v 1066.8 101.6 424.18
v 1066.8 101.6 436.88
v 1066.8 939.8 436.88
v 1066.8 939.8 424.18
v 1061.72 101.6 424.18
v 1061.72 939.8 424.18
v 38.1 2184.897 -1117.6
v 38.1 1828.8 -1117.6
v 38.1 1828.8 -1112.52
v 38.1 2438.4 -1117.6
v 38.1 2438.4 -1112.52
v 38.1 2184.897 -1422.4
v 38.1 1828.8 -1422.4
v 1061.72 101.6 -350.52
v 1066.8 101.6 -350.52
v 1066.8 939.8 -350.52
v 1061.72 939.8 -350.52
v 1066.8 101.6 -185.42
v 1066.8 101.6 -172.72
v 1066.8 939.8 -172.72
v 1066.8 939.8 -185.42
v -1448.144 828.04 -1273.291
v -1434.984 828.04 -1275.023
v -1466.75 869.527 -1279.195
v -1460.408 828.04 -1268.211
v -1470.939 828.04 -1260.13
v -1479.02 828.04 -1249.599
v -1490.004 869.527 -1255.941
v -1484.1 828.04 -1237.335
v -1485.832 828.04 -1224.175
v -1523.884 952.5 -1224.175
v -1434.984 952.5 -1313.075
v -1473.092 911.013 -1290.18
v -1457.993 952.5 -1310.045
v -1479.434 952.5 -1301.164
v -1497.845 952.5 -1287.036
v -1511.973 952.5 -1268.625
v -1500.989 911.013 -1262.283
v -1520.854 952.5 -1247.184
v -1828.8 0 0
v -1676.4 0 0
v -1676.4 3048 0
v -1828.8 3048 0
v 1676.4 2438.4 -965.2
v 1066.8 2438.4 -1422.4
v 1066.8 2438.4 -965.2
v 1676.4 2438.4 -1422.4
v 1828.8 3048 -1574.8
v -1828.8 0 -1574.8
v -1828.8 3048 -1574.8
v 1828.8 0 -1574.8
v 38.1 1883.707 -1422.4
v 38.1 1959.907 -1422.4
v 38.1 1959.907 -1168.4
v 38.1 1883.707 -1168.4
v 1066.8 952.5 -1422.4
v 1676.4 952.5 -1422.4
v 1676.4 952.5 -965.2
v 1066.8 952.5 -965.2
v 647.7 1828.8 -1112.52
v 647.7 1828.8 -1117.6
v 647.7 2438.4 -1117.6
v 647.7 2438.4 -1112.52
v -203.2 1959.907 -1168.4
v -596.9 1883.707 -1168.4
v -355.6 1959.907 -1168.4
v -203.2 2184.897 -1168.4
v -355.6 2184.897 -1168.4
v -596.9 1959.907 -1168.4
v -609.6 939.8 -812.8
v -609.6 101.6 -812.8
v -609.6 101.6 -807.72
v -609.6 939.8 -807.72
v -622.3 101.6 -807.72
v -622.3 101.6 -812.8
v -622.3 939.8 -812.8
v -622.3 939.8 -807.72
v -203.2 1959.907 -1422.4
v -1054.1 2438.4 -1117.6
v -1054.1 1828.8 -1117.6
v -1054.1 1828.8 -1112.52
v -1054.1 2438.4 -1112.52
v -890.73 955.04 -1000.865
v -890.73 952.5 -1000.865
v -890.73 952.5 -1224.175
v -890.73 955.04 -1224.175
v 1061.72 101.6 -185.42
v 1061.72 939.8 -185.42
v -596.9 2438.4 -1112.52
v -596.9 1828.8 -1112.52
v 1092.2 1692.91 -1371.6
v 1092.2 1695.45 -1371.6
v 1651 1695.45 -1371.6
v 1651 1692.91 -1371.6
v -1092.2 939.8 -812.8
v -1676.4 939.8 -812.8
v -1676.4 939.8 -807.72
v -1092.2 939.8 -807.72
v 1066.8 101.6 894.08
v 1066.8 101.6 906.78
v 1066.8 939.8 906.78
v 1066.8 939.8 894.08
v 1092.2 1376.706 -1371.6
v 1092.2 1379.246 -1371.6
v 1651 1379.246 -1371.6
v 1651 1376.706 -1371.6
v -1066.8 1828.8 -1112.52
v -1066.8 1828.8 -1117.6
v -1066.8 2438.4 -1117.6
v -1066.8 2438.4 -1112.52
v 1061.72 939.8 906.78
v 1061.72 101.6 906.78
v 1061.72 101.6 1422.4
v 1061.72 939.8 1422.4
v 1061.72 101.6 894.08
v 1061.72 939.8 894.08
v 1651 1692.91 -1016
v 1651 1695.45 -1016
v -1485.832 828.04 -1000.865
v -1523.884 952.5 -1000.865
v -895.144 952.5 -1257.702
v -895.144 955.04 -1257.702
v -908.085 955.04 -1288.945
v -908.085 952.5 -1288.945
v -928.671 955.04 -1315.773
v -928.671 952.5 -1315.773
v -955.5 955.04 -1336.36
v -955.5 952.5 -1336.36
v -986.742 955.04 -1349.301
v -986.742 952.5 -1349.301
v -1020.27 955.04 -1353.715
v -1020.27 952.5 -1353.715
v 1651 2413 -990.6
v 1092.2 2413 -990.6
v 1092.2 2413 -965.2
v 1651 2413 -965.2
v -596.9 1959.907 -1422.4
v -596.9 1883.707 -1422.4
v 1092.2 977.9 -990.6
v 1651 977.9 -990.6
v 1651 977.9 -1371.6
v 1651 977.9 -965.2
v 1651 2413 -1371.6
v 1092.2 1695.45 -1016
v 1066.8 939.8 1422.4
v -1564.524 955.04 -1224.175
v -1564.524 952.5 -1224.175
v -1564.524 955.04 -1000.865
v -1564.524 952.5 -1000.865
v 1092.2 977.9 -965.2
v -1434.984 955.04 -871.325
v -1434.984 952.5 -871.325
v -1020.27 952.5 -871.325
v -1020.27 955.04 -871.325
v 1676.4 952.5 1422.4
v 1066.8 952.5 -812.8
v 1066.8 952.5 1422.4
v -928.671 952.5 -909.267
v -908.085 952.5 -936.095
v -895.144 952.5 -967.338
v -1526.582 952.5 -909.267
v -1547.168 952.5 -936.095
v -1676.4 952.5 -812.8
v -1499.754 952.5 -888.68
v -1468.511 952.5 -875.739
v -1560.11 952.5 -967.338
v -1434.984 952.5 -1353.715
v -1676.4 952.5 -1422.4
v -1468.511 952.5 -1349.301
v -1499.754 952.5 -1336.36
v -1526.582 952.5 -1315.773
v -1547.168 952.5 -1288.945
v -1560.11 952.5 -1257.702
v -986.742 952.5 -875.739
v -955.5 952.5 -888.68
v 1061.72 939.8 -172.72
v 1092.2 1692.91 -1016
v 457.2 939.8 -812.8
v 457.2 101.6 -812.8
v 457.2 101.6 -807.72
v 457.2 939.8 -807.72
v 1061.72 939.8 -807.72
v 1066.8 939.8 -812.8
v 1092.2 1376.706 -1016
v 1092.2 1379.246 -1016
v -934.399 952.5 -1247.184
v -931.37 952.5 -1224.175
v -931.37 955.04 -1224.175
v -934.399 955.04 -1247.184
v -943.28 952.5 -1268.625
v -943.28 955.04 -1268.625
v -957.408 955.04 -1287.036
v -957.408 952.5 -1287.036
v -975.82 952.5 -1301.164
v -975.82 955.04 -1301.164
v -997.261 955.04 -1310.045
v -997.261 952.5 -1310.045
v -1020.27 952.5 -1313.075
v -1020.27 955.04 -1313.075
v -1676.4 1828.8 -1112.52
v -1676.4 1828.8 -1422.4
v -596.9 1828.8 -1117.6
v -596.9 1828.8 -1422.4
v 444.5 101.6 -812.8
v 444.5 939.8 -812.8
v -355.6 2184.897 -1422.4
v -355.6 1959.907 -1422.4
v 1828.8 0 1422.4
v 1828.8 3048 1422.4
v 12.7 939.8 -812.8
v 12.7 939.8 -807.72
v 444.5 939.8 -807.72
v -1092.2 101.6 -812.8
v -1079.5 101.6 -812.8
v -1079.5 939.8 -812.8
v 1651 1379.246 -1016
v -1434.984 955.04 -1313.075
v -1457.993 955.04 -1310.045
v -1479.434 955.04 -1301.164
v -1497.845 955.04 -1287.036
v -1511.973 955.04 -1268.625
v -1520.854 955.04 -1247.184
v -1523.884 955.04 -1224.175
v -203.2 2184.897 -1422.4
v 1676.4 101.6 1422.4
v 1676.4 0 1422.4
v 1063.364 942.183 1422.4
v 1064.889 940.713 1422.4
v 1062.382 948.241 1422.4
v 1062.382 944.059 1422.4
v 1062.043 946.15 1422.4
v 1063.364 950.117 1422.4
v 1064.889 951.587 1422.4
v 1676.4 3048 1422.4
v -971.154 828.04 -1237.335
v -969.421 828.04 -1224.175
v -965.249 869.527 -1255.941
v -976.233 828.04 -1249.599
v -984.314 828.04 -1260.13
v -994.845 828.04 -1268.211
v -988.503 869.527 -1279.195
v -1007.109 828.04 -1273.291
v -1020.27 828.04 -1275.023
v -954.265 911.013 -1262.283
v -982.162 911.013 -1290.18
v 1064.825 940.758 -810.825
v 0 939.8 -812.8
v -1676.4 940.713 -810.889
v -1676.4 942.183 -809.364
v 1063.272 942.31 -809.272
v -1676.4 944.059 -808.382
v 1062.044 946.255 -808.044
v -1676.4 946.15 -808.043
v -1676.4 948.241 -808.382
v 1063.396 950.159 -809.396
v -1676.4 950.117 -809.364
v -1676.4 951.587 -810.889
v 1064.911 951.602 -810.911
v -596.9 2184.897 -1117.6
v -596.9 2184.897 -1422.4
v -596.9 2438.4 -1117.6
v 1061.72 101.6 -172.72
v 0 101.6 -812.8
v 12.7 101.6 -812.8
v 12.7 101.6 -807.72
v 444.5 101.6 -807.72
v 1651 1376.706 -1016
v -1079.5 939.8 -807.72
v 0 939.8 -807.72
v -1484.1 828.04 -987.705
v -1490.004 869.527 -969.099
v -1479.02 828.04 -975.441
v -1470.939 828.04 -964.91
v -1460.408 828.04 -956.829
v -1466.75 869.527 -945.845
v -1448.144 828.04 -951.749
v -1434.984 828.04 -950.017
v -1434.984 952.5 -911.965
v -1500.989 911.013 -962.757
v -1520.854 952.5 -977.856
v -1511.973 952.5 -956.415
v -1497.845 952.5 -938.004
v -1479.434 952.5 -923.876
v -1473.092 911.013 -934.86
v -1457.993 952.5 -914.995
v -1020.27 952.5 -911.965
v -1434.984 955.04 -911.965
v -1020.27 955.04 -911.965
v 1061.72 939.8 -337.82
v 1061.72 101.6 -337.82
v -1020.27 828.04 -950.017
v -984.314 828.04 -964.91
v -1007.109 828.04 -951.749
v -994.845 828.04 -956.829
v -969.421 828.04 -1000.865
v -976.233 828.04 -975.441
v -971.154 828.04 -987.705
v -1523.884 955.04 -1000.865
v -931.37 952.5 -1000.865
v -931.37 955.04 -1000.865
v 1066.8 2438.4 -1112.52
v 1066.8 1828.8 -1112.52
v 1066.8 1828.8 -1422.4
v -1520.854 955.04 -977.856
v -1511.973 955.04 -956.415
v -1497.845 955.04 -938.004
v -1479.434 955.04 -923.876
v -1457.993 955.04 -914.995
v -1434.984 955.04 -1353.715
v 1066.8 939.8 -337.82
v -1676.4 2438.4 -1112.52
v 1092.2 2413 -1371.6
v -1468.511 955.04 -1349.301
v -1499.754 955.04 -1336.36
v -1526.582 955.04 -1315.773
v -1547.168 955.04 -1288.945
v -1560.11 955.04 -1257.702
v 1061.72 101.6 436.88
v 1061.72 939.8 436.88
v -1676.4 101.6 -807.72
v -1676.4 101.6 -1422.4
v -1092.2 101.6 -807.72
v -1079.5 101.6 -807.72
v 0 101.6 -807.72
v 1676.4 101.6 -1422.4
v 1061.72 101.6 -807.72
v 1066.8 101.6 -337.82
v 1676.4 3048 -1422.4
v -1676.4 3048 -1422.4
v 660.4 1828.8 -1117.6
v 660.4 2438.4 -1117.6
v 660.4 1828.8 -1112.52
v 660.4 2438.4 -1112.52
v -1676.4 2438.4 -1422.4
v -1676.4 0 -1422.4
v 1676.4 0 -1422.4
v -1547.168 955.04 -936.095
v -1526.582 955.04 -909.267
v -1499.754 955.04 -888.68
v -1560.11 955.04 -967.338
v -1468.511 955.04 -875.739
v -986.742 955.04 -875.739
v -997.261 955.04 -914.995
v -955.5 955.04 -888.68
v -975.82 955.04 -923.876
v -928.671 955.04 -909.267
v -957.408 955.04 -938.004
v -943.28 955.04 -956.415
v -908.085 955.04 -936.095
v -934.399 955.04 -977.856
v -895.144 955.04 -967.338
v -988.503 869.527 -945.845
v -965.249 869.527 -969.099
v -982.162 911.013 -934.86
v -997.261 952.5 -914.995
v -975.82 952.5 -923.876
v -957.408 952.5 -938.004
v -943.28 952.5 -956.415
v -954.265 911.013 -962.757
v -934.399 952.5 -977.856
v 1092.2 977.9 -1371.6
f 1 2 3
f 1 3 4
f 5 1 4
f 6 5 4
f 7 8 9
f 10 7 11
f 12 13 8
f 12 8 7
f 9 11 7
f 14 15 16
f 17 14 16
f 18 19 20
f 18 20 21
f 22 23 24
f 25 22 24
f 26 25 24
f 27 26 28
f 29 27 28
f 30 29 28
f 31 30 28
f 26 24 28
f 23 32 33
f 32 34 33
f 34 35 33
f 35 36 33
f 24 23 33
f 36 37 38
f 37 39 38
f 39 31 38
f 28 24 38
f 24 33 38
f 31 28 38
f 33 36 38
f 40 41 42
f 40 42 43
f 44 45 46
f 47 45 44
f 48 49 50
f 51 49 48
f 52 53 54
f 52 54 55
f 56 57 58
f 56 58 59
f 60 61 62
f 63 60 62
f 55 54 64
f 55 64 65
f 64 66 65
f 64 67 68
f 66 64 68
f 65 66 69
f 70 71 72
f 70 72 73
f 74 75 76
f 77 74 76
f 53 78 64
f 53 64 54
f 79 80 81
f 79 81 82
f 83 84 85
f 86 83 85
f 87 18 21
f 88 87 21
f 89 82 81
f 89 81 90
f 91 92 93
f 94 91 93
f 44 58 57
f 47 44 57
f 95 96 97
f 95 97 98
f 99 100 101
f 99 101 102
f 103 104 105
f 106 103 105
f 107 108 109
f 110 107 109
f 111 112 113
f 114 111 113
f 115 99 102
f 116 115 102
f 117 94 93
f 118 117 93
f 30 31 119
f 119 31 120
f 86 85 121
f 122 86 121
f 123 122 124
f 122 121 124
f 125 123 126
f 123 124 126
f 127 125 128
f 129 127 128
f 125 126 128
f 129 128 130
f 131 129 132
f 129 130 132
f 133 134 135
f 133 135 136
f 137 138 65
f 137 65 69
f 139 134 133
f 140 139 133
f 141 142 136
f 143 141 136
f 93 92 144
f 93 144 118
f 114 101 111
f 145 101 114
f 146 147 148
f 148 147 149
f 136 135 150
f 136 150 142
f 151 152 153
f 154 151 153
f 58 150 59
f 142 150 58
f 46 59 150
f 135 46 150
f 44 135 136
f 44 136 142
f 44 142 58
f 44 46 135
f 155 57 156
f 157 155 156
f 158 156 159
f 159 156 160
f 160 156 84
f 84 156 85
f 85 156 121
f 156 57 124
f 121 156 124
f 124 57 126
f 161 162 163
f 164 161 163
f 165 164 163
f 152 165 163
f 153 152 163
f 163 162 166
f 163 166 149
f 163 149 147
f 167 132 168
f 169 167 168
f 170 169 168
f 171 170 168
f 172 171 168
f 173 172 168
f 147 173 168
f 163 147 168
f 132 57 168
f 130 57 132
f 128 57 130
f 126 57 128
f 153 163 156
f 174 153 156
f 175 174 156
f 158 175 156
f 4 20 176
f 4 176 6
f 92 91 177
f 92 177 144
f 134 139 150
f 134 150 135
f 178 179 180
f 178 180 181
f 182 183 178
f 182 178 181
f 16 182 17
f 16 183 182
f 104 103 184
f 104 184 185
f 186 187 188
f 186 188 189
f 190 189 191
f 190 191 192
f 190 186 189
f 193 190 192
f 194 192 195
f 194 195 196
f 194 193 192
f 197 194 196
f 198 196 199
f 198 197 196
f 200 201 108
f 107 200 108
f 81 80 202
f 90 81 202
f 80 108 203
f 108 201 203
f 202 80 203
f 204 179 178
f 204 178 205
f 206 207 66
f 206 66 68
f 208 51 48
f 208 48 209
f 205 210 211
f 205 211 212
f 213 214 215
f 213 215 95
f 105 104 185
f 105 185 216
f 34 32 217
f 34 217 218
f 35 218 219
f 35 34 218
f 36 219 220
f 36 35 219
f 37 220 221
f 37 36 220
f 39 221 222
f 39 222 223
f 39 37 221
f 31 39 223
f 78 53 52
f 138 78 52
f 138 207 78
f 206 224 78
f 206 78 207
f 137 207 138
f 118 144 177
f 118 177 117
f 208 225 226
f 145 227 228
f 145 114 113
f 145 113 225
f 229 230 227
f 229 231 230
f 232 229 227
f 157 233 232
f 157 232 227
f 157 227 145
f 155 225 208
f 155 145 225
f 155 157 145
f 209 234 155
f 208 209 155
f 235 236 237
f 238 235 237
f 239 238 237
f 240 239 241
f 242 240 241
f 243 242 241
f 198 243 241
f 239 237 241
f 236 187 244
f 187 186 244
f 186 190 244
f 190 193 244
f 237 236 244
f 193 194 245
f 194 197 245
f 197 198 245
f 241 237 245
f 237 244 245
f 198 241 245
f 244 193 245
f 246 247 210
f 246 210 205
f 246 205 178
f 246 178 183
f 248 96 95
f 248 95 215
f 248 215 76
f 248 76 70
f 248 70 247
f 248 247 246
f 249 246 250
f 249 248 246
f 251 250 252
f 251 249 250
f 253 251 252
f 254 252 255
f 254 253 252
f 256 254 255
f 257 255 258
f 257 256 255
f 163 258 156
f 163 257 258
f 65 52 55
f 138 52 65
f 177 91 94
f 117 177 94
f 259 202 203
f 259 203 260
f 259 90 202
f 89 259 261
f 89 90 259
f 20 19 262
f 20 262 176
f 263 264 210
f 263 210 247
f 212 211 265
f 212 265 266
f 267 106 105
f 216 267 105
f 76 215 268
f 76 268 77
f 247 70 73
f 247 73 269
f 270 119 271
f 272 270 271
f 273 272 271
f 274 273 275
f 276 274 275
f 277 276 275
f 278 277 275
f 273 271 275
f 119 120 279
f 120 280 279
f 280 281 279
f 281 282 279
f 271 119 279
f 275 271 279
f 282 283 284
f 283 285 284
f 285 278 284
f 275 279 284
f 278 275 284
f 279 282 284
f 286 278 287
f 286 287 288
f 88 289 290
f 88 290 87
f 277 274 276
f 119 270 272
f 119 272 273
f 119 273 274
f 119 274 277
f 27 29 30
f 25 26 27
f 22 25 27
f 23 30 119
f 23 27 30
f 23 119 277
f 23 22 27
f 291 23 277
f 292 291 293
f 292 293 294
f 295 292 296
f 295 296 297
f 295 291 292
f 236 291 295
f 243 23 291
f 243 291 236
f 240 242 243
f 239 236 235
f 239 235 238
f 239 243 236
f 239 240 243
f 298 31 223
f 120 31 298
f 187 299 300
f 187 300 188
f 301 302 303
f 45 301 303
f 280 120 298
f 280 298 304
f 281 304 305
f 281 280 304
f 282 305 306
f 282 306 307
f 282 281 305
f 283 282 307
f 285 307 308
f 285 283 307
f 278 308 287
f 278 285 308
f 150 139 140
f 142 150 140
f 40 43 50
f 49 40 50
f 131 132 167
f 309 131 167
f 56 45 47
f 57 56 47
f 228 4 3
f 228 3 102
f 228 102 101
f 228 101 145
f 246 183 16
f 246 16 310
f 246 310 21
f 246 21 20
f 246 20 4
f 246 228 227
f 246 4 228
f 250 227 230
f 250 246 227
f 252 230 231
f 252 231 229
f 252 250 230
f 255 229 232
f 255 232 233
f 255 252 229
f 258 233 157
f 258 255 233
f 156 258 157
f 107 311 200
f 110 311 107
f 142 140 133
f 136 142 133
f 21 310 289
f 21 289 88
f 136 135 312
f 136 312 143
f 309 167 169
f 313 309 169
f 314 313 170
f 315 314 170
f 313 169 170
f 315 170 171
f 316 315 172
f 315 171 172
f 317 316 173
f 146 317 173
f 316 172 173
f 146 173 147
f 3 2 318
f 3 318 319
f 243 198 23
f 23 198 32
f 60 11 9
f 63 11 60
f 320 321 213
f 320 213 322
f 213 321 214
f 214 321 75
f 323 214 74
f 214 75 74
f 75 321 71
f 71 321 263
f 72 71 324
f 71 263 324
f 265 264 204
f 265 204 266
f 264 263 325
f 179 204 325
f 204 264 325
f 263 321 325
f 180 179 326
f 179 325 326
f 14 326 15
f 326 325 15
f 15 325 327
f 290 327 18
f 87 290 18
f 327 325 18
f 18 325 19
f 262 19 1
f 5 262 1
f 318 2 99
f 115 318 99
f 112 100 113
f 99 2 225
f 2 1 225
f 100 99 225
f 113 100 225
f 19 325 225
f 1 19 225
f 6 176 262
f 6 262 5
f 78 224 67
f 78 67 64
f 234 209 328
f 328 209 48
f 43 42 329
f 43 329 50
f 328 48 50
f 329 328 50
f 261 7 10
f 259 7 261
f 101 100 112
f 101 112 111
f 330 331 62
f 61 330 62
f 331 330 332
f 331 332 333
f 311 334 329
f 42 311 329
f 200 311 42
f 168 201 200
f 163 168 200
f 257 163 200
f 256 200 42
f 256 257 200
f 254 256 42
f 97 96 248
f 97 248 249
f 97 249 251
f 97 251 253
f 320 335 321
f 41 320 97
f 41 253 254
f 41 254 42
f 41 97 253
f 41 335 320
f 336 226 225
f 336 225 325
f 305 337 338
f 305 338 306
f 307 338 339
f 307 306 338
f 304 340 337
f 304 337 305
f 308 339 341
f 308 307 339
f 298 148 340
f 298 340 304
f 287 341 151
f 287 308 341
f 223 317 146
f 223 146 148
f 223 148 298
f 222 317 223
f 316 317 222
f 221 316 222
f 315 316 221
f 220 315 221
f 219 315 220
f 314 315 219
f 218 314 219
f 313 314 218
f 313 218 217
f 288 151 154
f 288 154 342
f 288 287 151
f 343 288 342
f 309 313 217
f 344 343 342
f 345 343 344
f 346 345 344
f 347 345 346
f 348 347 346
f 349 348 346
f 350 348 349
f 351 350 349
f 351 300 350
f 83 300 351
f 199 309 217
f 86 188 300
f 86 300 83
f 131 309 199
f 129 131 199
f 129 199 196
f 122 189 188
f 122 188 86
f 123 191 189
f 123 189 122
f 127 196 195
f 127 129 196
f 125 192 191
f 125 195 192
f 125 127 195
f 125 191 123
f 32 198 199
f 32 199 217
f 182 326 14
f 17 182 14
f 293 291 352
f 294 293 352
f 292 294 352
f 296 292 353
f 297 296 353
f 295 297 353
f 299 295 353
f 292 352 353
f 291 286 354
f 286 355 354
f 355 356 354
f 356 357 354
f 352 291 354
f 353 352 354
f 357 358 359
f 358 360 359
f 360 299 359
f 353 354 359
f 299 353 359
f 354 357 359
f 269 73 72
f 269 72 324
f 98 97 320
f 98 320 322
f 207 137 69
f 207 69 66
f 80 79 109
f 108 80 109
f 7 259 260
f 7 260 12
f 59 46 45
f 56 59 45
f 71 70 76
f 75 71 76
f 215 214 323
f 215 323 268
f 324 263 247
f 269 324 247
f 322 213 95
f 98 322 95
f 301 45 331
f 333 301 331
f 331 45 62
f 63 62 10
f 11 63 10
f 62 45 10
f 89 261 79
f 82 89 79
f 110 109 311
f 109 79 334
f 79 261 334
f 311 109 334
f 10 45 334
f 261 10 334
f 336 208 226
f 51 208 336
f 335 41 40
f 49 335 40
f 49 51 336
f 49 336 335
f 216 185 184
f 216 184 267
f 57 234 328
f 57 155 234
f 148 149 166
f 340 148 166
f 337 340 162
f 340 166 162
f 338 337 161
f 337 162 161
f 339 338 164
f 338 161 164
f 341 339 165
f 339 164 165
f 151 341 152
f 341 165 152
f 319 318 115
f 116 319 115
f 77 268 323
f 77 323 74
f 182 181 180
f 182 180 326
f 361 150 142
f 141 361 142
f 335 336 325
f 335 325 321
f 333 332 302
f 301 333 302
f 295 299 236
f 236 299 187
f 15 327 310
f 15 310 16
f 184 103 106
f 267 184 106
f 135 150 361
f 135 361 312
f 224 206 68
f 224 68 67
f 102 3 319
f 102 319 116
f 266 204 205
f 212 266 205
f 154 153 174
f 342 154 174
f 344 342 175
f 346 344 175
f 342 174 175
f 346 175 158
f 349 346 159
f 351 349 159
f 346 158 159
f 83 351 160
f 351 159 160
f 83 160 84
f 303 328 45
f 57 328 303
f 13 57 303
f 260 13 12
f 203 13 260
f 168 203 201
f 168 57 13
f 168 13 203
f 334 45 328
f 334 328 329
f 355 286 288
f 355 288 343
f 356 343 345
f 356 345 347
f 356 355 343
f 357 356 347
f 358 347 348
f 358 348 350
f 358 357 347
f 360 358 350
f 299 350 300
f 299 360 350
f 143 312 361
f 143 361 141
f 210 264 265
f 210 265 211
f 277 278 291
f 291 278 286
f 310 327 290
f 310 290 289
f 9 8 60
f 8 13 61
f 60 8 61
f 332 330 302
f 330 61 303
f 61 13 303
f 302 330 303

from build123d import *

# Parameters (mm, degrees)
BOSS_EXTRUDE1_DEPTH   = 3048
BOSS_EXTRUDE2_START   = 101.6
BOSS_EXTRUDE2_DEPTH   = 838.2
SKETCH5_W             = 584.2
SKETCH5_H             = 838.2
SKETCH5_W_2           = 457.2
SKETCH5_W_3           = 609.6
SKETCH5_W_4           = 431.8
BOSS_EXTRUDE3_DEPTH   = 5.08
SKETCH10_W            = 457.2
SKETCH10_H            = 838.2
SKETCH10_W_2          = 152.4
SKETCH10_W_3          = 596.9
SKETCH10_W_4          = 515.62
BOSS_EXTRUDE4_DEPTH   = 5.08
BOSS_EXTRUDE5_START   = 1828.8
BOSS_EXTRUDE5_DEPTH   = 609.6
SKETCH12_W            = 609.6
SKETCH12_H            = 609.6
SKETCH12_W_2          = 457.2
SKETCH12_W_3          = 711.2
BOSS_EXTRUDE6_DEPTH   = 5.08
SKETCH13_W            = 635
SKETCH13_H            = 356.096937619
CUT_EXTRUDE2_DEPTH    = 304.8
BOSS_EXTRUDE7_DEPTH   = 254
SKETCH15_W            = 304.8
SKETCH15_H            = 609.6
CUT_EXTRUDE3_DEPTH    = 2844.8
SKETCH16_W            = 609.6
SKETCH16_H            = 609.6
CUT_EXTRUDE4_DEPTH    = 2844.8
BOSS_EXTRUDE8_REACH   = 3432.787
SKETCH17_W            = 609.6
SKETCH17_H            = 457.2
SKETCH18_W            = 558.8
SKETCH18_H            = 1435.1
CUT_EXTRUDE5_DEPTH    = 406.4
SKETCH19_W            = 558.8
SKETCH19_H            = 2.54
EXTRUDE_THIN1_DEPTH   = 355.6
EXTRUDE_THIN1_2_DEPTH = 355.6
BOSS_EXTRUDE9_START   = 25.4
SKETCH20_W            = 558.8
SKETCH20_H            = 1435.1
BOSS_EXTRUDE9_DEPTH   = 25.4
CUT_EXTRUDE6_DEPTH    = 124.46
CUT_EXTRUDE6_DRAFT    = -17
BOSS_EXTRUDE10_DEPTH  = 2.54


with BuildPart() as part:
    # Sketch1 → Boss-Extrude1 (new body)
    with BuildSketch(Plane(origin=(0, 0, 0), x_dir=(1, 0, 0), z_dir=(0, 1, 0))):
        Polygon((-1828.8, 0), (-1828.8, 1574.8), (1828.8, 1574.8), (1828.8, -1422.4), (1676.4, -1422.4), (1676.4, 1422.4), (-1676.4, 1422.4), (-1676.4, 0), align=None)
    extrude(amount=BOSS_EXTRUDE1_DEPTH)



with BuildPart() as body_2:
    # Sketch2 → Boss-Extrude2 (new body)
    with BuildSketch(Plane(origin=(0, 0, 0), x_dir=(1, 0, 0), z_dir=(0, 1, 0)).offset(BOSS_EXTRUDE2_START)):
        Polygon((1676.4, 1422.4), (1676.4, -1422.4), (1066.8, -1422.4), (1066.8, 812.8), (-1676.4, 812.8), (-1676.4, 1422.4), align=None)
    extrude(amount=BOSS_EXTRUDE2_DEPTH)


with BuildPart() as part_1:
    add(part.part)

    add(body_2.part)  # Sweep2 merges body 2
    # Sweep2: sweep along a path in Sketch3
    with BuildLine(Plane(origin=(0, 939.8, 0), x_dir=(1, 0, 0), z_dir=(0, 1, 0))) as sweep2_path:
        Line((1066.8, -1422.4), (1066.8, 812.8))
        Line((1066.8, 812.8), (-1676.4, 812.8))
    # Sketch4 → Sweep2 (sweep)
    with BuildSketch(Plane.XY.offset(1422.4)):
        with BuildLine():
            Line((1676.4, 939.8), (1066.8, 939.8))
            ThreePointArc((1066.8, 939.8), (1062.043473448, 946.15), (1066.8, 952.5))
            Line((1066.8, 952.5), (1676.4, 952.5))
            Line((1676.4, 952.5), (1676.4, 939.8))
        make_face()
    sweep(path=sweep2_path.line, transition=Transition.RIGHT)

    # Sketch5 → Boss-Extrude3 (add)
    with BuildSketch(Plane.XY.offset(-812.8)):
        with Locations((-1384.3, 520.7)):
            Rectangle(SKETCH5_W, SKETCH5_H)
        with Locations((-850.9, 520.7)):
            Rectangle(SKETCH5_W_2, SKETCH5_H)
        with Locations((-304.8, 520.7)):
            Rectangle(SKETCH5_W_3, SKETCH5_H)
        with Locations((762, 520.7)):
            Rectangle(SKETCH5_W_3, SKETCH5_H)
        with Locations((228.6, 520.7)):
            Rectangle(SKETCH5_W_4, SKETCH5_H)
    extrude(amount=BOSS_EXTRUDE3_DEPTH)

    # Sketch10 → Boss-Extrude4 (add)
    with BuildSketch(Plane.ZY.offset(-1066.8)):
        with Locations((-579.12, 520.7)):
            Rectangle(SKETCH10_W, SKETCH10_H)
        with Locations((-261.62, 520.7)):
            Rectangle(SKETCH10_W_2, SKETCH10_H)
        with Locations((125.73, 520.7)):
            Rectangle(SKETCH10_W_3, SKETCH10_H)
        with Locations((1164.59, 520.7)):
            Rectangle(SKETCH10_W_4, SKETCH10_H)
        with Locations((665.48, 520.7)):
            Rectangle(SKETCH10_W, SKETCH10_H)
    extrude(amount=BOSS_EXTRUDE4_DEPTH)

    # Sketch11 → Boss-Extrude5 (add)
    with BuildSketch(Plane(origin=(0, 0, 0), x_dir=(1, 0, 0), z_dir=(0, 1, 0)).offset(BOSS_EXTRUDE5_START)):
        Polygon((1676.4, 1422.4), (1676.4, -1422.4), (1371.6, -1422.4), (1371.6, 1117.6), (-1676.4, 1117.6), (-1676.4, 1422.4), align=None)
    extrude(amount=BOSS_EXTRUDE5_DEPTH)

    # Sketch12 → Boss-Extrude6 (add)
    with BuildSketch(Plane.XY.offset(-1117.6)):
        with Locations((-1371.6, 2133.6)):
            Rectangle(SKETCH12_W, SKETCH12_H)
        with Locations((-825.5, 2133.6)):
            Rectangle(SKETCH12_W_2, SKETCH12_H)
        with Locations((342.9, 2133.6)):
            Rectangle(SKETCH12_W, SKETCH12_H)
        with Locations((1016, 2133.6)):
            Rectangle(SKETCH12_W_3, SKETCH12_H)
    extrude(amount=BOSS_EXTRUDE6_DEPTH)

    # Sketch13 → Cut-Extrude2 (cut)
    with BuildSketch(Plane.XY.offset(-1117.6)):
        with Locations((-279.4, 2006.84846881)):
            Rectangle(SKETCH13_W, SKETCH13_H)
    extrude(amount=-CUT_EXTRUDE2_DEPTH, mode=Mode.SUBTRACT)

    # Sketch15 → Cut-Extrude3 (cut)
    with BuildSketch(Plane.XY.offset(1422.4)):
        with Locations((1524, 2133.6)):
            Rectangle(SKETCH15_W, SKETCH15_H)
    extrude(amount=-CUT_EXTRUDE3_DEPTH, mode=Mode.SUBTRACT)

    # Sketch16 → Cut-Extrude4 (cut)
    with BuildSketch(Plane(origin=(0, 952.5, 0), x_dir=(1, 0, 0), z_dir=(0, 1, 0))):
        with Locations((1371.6, 1117.6)):
            Rectangle(SKETCH16_W, SKETCH16_H)
    extrude(amount=CUT_EXTRUDE4_DEPTH, mode=Mode.SUBTRACT)


with BuildPart() as body_2_2:
    # Sketch14 → Boss-Extrude7 (new body)
    with BuildSketch(Plane.XY.offset(-1422.4)):
        Polygon((-355.6, 2184.896937619), (-203.2, 2184.896937619), (-203.2, 1959.906980292), (38.1, 1959.906980292), (38.1, 1883.706980292), (-596.9, 1883.706980292), (-596.9, 1959.906980292), (-355.6, 1959.906980292), align=None)
    extrude(amount=BOSS_EXTRUDE7_DEPTH)


with BuildPart() as body_3:

    # Sketch17 → Boss-Extrude8 (new, up to next)
    with BuildSketch(Plane(origin=(0, 2438.4, 0), x_dir=(1, 0, 0), z_dir=(0, 1, 0)), mode=Mode.PRIVATE) as boss_extrude8_sk1:
        with Locations((1371.6, 1193.8)):
            Rectangle(SKETCH17_W, SKETCH17_H)
    boss_extrude8_tool1 = extrude(boss_extrude8_sk1.sketch, amount=-BOSS_EXTRUDE8_REACH, mode=Mode.PRIVATE) - part_1.part
    add(boss_extrude8_tool1.solids().sort_by_distance((1371.6, 2438.4, -1193.8))[0])

    # Sketch18 → Cut-Extrude5 (cut)
    with BuildSketch(Plane.XY.offset(-965.2)):
        with Locations((1371.6, 1695.45)):
            Rectangle(SKETCH18_W, SKETCH18_H)
    extrude(amount=-CUT_EXTRUDE5_DEPTH, mode=Mode.SUBTRACT)


with BuildPart() as body_4:
    # Sketch19 → Extrude-Thin1 (new body)
    with BuildSketch(Plane.XY.offset(-1371.6)):
        with Locations((1371.6, 1694.18)):
            Rectangle(SKETCH19_W, SKETCH19_H)
    extrude(amount=EXTRUDE_THIN1_DEPTH)


with BuildPart() as body_5:
    # Sketch19 → Extrude-Thin1 2 (new body)
    with BuildSketch(Plane.XY.offset(-1371.6)):
        with Locations((1371.6, 1377.976430218)):
            Rectangle(SKETCH19_W, SKETCH19_H)
    extrude(amount=EXTRUDE_THIN1_2_DEPTH)


with BuildPart() as body_6:
    # Sketch20 → Boss-Extrude9 (new body)
    with BuildSketch(Plane.XY.offset(-1016).offset(BOSS_EXTRUDE9_START)):
        with Locations((1371.6, 1695.45)):
            Rectangle(SKETCH20_W, SKETCH20_H)
    extrude(amount=BOSS_EXTRUDE9_DEPTH)


with BuildPart() as cut_extrude6_tool:
    # Sketch21 → Cut-Extrude6 (with draft: the straight prism first)
    with BuildSketch(Plane(origin=(0, 952.5, 0), x_dir=(1, 0, 0), z_dir=(0, 1, 0))):
        with BuildLine():
            Line((-1434.983537016, 911.965361051), (-1020.269732089, 911.965361051))
            ThreePointArc((-1020.269732089, 911.965361051), (-957.407939242, 938.003568204), (-931.369732089, 1000.865361051))
            Line((-931.369732089, 1000.865361051), (-931.369732089, 1224.174638949))
            ThreePointArc((-931.369732089, 1224.174638949), (-957.407939242, 1287.036431796), (-1020.269732089, 1313.074638949))
            Line((-1020.269732089, 1313.074638949), (-1434.983537016, 1313.074638949))
            ThreePointArc((-1434.983537016, 1313.074638949), (-1497.845329863, 1287.036431796), (-1523.883537016, 1224.174638949))
            Line((-1523.883537016, 1224.174638949), (-1523.883537016, 1000.865361051))
            ThreePointArc((-1523.883537016, 1000.865361051), (-1497.845329863, 938.003568204), (-1434.983537016, 911.965361051))
        make_face()
    extrude(amount=-CUT_EXTRUDE6_DEPTH)
    # Cut-Extrude6: the draft: its side faces are tilted about the plane it starts from
    cut_extrude6_sides = [cut_extrude6_tool.faces().sort_by_distance(p)[0] for p in [
        (-1497.845329863, 890.27, -938.003568204),
        (-1227.626634553, 890.27, -911.965361051),
        (-957.407939242, 890.27, -938.003568204),
        (-931.369732089, 890.27, -1112.52),
        (-957.407939242, 890.27, -1287.036431796),
        (-1227.626634553, 890.27, -1313.074638949),
        (-1497.845329863, 890.27, -1287.036431796),
        (-1523.883537016, 890.27, -1112.52),
    ]]
    draft(cut_extrude6_sides, Plane(origin=(0, 952.5, 0), x_dir=(1, 0, 0), z_dir=(0, 1, 0)), CUT_EXTRUDE6_DRAFT)


with BuildPart() as part_2:
    add(part_1.part)

    # Cut-Extrude6: cut by cut_extrude6_tool
    add(cut_extrude6_tool.part, mode=Mode.SUBTRACT)

    # Sketch22 → Boss-Extrude10 (add)
    with BuildSketch(Plane(origin=(0, 952.5, 0), x_dir=(1, 0, 0), z_dir=(0, 1, 0))):
        with BuildLine():
            Line((-1434.983537016, 871.325361051), (-1020.269732089, 871.325361051))
            ThreePointArc((-1020.269732089, 871.325361051), (-928.671119655, 909.266748616), (-890.729732089, 1000.865361051))
            Line((-890.729732089, 1000.865361051), (-890.729732089, 1224.174638949))
            ThreePointArc((-890.729732089, 1224.174638949), (-928.671119655, 1315.773251384), (-1020.269732089, 1353.714638949))
            Line((-1020.269732089, 1353.714638949), (-1434.983537016, 1353.714638949))
            ThreePointArc((-1434.983537016, 1353.714638949), (-1526.582149451, 1315.773251384), (-1564.523537016, 1224.174638949))
            Line((-1564.523537016, 1224.174638949), (-1564.523537016, 1000.865361051))
            ThreePointArc((-1564.523537016, 1000.865361051), (-1526.582149451, 909.266748616), (-1434.983537016, 871.325361051))
        make_face()
        with BuildLine():
            Line((-931.369732089, 1000.865361051), (-931.369732089, 1224.174638949))
            ThreePointArc((-931.369732089, 1224.174638949), (-957.407939242, 1287.036431796), (-1020.269732089, 1313.074638949))
            Line((-1020.269732089, 1313.074638949), (-1434.983537016, 1313.074638949))
            ThreePointArc((-1434.983537016, 1313.074638949), (-1497.845329863, 1287.036431796), (-1523.883537016, 1224.174638949))
            Line((-1523.883537016, 1224.174638949), (-1523.883537016, 1000.865361051))
            ThreePointArc((-1523.883537016, 1000.865361051), (-1497.845329863, 938.003568204), (-1434.983537016, 911.965361051))
            Line((-1434.983537016, 911.965361051), (-1020.269732089, 911.965361051))
            ThreePointArc((-1020.269732089, 911.965361051), (-957.407939242, 938.003568204), (-931.369732089, 1000.865361051))
        make_face(mode=Mode.SUBTRACT)
    extrude(amount=BOSS_EXTRUDE10_DEPTH)


solid = Compound([body_2_2.part, body_3.part, body_4.part, body_5.part, body_6.part, part_2.part])
